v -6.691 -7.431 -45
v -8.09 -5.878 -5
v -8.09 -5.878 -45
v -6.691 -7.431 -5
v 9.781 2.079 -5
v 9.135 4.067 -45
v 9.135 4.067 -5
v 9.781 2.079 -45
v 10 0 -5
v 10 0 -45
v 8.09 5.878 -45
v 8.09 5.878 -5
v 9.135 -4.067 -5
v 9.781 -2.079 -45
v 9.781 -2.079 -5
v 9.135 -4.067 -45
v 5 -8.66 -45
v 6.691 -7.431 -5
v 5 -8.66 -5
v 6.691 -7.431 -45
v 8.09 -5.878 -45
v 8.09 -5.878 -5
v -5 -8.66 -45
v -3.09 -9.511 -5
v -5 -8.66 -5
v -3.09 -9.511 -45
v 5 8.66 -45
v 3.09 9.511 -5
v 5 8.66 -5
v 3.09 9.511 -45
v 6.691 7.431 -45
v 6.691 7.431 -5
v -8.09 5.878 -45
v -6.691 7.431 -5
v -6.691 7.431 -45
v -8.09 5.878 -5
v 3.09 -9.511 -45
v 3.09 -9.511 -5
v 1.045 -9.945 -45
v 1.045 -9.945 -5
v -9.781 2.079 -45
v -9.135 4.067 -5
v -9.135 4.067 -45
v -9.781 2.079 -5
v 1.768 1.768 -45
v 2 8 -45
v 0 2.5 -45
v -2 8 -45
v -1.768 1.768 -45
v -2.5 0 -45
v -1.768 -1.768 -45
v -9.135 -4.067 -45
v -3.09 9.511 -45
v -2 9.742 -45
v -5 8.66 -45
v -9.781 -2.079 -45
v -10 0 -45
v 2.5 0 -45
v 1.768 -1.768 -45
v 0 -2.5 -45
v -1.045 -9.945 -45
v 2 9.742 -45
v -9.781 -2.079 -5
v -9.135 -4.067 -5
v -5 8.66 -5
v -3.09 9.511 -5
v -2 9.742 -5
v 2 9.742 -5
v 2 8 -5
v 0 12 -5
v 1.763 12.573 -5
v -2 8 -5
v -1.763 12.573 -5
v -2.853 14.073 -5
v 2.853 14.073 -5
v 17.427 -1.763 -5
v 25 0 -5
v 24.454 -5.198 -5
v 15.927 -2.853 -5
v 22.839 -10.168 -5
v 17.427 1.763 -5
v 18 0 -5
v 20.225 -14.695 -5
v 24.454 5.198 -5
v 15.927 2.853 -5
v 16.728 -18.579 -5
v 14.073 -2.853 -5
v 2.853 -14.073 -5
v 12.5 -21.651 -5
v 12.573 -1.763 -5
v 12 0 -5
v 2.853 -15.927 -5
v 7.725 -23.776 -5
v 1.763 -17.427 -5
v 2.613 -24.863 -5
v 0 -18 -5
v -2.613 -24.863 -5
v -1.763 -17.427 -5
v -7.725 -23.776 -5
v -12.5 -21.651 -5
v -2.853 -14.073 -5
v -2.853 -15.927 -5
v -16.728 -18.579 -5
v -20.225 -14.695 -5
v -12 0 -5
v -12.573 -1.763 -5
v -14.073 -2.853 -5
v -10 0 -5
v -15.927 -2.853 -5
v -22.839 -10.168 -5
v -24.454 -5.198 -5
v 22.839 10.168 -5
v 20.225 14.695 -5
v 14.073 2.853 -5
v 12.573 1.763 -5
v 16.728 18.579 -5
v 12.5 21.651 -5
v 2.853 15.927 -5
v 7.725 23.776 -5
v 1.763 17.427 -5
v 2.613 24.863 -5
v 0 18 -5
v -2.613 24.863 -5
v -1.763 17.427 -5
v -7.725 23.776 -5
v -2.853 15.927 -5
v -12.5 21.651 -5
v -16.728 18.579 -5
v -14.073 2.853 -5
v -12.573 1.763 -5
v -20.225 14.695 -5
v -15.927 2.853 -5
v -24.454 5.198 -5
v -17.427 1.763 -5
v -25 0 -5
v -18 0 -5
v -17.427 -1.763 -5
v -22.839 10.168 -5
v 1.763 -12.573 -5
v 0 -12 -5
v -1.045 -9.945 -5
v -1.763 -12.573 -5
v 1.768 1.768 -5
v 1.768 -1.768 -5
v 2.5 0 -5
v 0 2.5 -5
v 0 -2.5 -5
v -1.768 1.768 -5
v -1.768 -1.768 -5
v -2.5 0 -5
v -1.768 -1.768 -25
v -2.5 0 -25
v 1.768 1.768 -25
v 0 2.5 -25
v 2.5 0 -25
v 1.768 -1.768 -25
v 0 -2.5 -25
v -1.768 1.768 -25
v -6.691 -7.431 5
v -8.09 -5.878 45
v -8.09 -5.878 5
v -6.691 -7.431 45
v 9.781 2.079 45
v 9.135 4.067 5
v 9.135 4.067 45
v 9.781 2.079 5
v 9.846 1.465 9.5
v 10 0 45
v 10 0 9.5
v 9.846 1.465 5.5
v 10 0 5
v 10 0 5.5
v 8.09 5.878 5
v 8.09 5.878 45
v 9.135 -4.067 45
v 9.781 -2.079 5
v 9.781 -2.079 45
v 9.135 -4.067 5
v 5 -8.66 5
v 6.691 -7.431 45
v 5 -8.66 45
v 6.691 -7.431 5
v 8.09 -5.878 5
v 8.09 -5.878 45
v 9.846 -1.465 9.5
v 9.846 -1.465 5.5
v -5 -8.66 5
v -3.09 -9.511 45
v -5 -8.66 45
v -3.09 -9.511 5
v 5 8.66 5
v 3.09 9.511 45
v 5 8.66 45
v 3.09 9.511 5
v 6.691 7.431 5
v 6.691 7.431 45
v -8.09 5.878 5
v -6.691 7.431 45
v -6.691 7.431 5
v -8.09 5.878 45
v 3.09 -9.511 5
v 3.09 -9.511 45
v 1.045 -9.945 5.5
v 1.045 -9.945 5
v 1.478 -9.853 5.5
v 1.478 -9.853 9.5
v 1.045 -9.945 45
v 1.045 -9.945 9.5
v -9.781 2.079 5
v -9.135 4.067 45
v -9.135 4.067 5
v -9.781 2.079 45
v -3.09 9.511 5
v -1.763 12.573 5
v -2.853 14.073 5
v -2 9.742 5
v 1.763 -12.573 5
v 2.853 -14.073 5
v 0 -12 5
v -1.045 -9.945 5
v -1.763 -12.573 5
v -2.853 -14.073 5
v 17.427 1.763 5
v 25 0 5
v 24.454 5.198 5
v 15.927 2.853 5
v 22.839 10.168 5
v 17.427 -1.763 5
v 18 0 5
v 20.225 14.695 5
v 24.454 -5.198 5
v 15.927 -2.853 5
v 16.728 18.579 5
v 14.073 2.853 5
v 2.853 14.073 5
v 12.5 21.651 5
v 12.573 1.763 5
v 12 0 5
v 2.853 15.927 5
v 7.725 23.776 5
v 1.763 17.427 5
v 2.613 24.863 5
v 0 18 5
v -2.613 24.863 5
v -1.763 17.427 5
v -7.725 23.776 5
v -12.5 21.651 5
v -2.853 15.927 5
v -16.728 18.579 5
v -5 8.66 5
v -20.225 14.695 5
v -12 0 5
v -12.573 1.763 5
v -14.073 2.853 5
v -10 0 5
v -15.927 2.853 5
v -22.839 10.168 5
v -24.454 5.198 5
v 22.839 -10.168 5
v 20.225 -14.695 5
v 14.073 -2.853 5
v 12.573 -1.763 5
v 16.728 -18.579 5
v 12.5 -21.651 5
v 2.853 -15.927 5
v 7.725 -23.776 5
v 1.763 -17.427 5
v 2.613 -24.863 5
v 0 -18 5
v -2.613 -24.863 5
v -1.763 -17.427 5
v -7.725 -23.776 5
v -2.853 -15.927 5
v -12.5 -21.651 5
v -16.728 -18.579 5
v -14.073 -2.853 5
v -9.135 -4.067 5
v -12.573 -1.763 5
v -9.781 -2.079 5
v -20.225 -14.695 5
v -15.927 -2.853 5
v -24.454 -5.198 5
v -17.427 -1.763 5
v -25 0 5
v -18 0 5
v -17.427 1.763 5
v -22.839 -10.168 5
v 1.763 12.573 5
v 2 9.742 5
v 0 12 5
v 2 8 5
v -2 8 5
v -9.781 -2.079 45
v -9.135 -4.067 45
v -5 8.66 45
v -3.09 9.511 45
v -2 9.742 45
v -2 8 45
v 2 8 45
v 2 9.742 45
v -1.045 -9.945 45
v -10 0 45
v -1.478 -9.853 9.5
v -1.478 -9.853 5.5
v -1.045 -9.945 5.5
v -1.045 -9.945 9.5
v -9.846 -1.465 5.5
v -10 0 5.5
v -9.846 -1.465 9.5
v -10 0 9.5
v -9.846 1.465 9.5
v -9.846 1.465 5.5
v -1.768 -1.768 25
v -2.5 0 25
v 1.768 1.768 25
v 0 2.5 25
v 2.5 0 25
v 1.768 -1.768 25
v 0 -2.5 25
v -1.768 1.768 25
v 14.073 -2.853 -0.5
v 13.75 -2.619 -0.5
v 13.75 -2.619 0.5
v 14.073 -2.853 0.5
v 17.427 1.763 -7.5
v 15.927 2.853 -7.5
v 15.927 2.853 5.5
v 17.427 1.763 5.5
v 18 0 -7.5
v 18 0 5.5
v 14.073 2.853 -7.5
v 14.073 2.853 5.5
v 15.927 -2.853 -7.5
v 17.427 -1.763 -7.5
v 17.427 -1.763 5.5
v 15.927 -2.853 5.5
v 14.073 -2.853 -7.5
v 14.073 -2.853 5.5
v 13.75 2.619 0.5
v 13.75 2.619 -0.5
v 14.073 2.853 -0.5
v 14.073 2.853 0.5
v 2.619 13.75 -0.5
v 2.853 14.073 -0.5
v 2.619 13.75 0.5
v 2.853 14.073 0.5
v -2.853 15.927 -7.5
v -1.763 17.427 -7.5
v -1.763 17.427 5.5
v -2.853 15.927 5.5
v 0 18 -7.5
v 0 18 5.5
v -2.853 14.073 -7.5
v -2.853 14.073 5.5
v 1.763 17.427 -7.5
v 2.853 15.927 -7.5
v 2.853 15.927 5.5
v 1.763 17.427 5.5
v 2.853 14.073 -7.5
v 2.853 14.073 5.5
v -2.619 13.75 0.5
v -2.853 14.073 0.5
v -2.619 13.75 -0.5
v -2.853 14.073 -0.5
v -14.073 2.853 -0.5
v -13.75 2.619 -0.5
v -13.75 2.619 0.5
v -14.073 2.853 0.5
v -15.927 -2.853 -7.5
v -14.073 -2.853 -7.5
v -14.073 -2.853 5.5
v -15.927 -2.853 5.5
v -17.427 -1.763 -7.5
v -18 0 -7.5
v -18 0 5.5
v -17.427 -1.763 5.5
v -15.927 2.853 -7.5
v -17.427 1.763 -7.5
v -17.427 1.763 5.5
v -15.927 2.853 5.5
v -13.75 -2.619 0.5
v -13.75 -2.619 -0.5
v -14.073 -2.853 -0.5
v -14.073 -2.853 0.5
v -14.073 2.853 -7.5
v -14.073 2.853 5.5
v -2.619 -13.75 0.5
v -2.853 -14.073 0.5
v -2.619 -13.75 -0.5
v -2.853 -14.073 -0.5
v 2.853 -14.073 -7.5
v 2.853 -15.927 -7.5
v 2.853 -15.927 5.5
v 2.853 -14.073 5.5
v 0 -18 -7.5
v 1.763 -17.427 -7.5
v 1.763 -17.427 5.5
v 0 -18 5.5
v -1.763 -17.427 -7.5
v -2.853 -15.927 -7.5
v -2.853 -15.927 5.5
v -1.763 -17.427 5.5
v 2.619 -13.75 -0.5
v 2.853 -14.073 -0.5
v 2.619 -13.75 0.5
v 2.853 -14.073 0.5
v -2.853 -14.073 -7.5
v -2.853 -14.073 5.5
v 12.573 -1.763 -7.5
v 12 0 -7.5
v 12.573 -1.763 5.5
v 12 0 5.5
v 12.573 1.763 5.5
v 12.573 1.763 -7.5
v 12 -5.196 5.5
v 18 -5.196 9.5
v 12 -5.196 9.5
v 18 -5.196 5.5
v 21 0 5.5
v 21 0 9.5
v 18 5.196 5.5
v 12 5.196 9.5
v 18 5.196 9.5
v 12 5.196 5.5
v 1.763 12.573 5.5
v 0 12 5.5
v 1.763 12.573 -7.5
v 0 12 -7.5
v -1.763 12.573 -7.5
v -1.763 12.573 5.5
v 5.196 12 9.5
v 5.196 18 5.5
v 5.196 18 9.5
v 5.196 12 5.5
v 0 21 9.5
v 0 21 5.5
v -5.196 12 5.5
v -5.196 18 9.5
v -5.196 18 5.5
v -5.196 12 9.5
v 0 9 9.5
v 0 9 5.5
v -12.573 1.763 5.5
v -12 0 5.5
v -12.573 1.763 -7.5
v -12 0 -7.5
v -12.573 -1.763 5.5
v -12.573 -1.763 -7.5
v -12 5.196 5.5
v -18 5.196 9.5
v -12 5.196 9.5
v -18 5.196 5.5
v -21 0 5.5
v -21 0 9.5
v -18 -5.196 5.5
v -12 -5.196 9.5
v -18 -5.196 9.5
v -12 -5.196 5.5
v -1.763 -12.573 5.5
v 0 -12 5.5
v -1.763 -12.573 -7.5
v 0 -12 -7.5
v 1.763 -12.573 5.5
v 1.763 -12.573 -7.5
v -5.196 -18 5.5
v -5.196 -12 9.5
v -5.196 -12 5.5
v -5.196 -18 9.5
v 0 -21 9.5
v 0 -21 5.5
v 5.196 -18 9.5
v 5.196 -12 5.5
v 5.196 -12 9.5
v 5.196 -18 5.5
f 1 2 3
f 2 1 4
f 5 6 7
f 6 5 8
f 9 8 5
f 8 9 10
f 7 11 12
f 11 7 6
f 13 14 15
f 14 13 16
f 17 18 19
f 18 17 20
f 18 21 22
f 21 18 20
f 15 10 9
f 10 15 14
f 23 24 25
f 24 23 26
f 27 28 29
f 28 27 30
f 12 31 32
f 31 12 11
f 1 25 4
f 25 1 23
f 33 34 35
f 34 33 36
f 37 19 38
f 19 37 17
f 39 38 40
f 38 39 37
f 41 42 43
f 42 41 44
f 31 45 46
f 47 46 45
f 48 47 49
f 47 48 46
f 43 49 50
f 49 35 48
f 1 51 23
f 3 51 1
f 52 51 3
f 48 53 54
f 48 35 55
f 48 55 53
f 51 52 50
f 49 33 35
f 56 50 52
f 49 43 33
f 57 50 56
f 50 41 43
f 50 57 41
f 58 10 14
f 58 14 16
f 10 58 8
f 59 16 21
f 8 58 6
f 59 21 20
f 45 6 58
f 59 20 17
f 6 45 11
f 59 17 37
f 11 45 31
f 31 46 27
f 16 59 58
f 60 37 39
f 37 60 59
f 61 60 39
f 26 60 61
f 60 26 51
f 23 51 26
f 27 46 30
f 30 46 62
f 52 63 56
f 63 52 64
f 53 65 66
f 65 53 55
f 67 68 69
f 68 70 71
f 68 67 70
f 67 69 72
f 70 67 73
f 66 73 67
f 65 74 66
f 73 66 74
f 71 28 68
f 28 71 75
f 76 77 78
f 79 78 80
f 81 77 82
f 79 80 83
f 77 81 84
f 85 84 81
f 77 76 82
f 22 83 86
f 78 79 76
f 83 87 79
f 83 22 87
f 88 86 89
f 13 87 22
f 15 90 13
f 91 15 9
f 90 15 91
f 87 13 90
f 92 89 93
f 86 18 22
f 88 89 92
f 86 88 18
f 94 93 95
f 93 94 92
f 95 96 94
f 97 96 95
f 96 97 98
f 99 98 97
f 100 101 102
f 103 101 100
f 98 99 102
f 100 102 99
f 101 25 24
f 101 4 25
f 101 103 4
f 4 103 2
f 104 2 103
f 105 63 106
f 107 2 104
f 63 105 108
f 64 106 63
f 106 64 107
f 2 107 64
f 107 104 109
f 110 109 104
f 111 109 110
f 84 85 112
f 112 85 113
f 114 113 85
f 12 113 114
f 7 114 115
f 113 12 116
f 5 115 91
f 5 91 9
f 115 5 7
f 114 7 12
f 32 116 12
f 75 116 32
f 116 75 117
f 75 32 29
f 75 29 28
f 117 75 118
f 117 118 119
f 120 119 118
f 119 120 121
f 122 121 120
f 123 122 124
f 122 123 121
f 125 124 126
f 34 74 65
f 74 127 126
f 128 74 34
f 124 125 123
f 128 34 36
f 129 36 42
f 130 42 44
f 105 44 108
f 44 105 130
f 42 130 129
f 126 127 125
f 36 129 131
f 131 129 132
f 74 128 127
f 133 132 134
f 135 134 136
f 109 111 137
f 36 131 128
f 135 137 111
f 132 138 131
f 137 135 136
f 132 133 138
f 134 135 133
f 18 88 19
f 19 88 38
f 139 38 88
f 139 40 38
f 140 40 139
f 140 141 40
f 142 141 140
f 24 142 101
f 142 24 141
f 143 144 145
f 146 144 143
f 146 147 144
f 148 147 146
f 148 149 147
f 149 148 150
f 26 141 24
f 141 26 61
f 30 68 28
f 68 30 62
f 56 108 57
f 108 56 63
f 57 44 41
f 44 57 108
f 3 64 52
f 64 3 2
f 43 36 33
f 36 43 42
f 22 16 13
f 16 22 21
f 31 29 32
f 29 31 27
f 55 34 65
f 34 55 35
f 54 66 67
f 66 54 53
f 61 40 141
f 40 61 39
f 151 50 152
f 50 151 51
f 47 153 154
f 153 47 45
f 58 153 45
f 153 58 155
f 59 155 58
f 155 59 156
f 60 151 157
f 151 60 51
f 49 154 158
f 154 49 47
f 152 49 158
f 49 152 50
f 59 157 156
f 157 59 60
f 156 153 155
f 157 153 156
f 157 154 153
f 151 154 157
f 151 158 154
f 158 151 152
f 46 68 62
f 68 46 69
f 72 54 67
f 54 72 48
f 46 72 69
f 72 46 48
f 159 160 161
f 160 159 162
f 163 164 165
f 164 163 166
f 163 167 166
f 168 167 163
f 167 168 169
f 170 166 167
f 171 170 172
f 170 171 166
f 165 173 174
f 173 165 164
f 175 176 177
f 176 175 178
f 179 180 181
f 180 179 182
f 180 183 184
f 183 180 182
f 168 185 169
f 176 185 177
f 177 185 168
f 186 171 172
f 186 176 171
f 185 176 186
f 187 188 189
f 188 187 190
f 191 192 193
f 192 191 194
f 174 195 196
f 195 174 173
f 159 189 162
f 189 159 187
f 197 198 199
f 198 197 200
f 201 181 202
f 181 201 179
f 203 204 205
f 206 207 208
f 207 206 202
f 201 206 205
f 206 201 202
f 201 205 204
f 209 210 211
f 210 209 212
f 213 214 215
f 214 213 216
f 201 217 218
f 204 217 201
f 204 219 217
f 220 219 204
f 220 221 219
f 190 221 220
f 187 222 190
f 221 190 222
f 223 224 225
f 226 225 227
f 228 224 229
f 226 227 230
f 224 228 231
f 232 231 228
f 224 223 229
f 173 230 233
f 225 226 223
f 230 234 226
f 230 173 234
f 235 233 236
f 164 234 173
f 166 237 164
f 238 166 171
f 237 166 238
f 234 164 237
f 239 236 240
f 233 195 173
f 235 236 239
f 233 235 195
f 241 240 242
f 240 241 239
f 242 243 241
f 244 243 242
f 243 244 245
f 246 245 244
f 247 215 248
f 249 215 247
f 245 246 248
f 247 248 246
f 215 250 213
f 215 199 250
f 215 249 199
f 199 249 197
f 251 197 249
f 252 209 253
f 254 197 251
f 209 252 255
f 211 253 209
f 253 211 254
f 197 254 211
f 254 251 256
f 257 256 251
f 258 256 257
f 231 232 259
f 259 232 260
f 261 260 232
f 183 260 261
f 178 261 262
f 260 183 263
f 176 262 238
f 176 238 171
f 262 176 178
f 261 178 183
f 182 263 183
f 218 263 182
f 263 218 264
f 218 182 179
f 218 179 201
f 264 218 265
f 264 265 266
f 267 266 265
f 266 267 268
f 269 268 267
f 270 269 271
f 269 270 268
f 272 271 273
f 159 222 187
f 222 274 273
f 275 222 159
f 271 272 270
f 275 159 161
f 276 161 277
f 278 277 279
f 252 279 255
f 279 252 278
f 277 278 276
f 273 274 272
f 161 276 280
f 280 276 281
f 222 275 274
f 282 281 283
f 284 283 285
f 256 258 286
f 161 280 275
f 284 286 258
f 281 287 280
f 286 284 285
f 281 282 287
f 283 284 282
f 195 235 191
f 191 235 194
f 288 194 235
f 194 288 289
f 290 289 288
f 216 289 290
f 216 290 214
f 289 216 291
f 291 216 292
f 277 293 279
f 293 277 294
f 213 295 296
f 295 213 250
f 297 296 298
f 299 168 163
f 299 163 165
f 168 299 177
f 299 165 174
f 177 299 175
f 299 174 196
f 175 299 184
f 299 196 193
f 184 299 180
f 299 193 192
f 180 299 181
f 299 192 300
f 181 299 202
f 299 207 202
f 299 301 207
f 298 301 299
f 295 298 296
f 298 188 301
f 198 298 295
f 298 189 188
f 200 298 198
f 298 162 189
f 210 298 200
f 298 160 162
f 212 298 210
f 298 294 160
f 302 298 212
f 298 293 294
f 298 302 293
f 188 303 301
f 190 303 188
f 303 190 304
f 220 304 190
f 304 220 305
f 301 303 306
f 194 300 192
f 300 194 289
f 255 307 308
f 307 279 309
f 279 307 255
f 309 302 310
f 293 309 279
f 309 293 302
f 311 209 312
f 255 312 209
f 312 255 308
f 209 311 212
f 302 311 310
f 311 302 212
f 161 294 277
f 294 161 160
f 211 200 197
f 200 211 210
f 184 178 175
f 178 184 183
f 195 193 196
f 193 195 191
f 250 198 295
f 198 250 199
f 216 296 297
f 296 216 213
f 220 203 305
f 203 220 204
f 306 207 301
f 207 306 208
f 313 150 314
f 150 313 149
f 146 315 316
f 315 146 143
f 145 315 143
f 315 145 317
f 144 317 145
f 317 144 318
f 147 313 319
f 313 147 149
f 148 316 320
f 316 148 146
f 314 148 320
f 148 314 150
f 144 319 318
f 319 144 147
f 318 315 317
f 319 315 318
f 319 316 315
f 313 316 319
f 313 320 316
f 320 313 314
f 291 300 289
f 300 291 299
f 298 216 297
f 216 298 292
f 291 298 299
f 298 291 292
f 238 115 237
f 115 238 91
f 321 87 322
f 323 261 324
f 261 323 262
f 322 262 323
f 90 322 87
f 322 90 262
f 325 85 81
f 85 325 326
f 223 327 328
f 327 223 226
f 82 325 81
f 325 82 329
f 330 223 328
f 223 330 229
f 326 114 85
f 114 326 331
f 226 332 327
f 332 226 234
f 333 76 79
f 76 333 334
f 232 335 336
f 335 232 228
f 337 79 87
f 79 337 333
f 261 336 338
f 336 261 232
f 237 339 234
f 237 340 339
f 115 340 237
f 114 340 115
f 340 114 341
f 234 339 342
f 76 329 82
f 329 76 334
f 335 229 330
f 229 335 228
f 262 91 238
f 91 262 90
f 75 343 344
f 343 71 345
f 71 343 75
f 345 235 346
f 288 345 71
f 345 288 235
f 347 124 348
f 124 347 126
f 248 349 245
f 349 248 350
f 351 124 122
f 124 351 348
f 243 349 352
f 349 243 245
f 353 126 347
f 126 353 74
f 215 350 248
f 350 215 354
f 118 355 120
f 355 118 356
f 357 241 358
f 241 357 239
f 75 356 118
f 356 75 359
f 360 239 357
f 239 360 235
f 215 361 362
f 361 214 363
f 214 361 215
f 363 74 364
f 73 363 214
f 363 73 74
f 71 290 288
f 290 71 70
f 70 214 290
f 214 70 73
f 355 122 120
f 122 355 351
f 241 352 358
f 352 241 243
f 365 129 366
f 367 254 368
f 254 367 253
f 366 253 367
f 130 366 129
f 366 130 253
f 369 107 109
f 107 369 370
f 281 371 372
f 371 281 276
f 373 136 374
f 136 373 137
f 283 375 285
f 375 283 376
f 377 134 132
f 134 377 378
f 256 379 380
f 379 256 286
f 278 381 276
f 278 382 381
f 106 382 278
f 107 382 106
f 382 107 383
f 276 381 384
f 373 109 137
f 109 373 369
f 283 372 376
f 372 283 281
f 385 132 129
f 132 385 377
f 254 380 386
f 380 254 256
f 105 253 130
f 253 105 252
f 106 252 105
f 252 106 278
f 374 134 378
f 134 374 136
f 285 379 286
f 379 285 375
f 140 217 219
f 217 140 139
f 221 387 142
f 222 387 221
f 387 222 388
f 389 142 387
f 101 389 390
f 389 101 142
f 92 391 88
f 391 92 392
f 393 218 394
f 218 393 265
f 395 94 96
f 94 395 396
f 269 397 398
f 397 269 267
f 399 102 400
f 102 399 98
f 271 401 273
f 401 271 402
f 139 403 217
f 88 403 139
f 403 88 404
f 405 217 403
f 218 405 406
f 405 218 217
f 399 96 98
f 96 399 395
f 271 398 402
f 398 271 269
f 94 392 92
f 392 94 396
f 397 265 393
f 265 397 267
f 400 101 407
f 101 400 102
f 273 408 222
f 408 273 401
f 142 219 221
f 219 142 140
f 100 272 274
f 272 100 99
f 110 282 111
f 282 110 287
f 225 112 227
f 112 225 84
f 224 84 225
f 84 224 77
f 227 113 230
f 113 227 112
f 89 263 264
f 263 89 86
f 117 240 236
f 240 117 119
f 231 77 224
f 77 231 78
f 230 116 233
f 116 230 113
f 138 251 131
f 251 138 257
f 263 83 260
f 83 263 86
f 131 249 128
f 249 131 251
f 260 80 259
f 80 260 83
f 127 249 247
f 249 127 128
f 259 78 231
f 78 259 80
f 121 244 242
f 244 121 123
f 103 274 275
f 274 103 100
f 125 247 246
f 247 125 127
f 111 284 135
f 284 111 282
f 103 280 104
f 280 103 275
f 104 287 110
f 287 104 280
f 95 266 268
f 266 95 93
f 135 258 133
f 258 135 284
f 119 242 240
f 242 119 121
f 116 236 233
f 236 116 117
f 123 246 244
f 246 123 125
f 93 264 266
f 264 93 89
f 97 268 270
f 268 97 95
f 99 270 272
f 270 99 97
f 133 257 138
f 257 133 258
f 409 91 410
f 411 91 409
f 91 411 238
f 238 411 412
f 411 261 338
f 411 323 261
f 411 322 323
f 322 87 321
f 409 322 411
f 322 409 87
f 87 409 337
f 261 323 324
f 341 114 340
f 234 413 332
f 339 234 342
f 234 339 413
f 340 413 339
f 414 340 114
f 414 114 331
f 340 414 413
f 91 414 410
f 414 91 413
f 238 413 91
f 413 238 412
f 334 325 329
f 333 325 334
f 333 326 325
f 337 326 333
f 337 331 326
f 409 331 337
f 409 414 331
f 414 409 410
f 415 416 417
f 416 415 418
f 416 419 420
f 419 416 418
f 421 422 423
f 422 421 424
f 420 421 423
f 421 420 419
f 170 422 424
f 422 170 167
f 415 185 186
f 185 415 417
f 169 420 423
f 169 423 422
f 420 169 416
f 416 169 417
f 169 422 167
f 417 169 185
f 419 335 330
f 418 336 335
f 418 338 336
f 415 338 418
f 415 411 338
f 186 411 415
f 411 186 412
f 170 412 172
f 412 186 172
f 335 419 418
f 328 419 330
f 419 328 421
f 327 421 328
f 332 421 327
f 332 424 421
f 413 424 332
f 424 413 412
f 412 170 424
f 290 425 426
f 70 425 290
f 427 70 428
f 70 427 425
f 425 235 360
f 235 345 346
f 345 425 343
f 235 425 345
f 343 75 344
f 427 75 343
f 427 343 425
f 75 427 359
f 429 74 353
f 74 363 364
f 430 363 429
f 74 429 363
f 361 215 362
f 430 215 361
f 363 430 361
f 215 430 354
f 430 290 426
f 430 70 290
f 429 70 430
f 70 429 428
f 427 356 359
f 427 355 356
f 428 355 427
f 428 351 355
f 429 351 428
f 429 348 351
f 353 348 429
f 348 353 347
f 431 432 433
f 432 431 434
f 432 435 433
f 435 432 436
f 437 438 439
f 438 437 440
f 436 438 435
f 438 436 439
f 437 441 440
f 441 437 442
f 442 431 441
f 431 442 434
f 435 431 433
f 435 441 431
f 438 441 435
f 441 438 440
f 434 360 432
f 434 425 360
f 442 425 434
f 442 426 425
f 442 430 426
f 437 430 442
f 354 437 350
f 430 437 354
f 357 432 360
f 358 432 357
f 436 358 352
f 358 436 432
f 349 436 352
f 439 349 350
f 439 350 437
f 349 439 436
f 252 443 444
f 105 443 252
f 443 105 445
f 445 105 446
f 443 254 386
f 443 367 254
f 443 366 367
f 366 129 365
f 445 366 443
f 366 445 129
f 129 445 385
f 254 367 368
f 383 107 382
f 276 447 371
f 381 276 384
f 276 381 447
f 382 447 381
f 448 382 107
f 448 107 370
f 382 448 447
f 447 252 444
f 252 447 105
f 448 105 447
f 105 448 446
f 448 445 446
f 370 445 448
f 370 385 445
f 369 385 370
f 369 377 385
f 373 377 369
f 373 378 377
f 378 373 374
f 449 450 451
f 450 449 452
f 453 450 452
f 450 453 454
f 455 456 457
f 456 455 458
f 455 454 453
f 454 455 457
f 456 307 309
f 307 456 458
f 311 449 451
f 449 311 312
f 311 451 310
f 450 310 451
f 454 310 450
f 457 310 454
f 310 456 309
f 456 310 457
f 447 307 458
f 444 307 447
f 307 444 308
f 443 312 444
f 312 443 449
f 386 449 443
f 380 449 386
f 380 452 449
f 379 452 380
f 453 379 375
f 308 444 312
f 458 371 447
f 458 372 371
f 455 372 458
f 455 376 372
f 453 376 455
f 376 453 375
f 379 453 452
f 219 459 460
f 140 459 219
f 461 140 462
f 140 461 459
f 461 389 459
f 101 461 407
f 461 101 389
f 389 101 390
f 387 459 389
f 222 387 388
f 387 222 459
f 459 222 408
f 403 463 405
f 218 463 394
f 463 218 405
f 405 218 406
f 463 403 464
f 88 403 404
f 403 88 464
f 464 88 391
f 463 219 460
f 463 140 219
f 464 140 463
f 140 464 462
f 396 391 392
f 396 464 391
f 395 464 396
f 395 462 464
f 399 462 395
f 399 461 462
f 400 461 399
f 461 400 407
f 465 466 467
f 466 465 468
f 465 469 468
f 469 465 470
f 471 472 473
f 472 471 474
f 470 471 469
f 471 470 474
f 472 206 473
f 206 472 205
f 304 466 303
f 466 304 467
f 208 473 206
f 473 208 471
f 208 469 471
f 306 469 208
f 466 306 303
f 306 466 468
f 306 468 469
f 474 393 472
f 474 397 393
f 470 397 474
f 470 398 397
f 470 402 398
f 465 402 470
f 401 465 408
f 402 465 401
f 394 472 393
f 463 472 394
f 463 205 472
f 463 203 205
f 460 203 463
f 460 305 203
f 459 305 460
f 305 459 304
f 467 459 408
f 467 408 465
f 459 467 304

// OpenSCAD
//start

// Parameters
shaft_diameter = 20;
shaft_length = 40;
flange_diameter = 50;
flange_thickness = 5;
bolt_hole_radius = 3;
bolt_radius = 3;
bolt_length = 15;
nut_size = 6;
diaphragm_thickness = 1;
diaphragm_diameter = 45;
keyway_width = 4;
keyway_depth = 2;

// Function to create a shaft with a keyway
module shaft() {
    difference() {
        cylinder(h=shaft_length, d=shaft_diameter, center=true);
        translate([0, 0, -shaft_length/2])
            cylinder(h=shaft_length, d=5, center=true); // Central hole
        translate([-keyway_width/2, shaft_diameter/2 - keyway_depth, -shaft_length/2])
            cube([keyway_width, keyway_depth, shaft_length]); // Keyway slot
    }
}

// Function to create a flange plate
module flange_plate() {
    difference() {
        cylinder(h=flange_thickness, d=flange_diameter, center=true);
        cylinder(h=flange_thickness+1, d=5, center=true); // Central hole
        for (i = [0:3]) {
            rotate([0, 0, i * 90])
                translate([flange_diameter/2 - 10, 0, 0])
                    cylinder(h=flange_thickness+1, r=bolt_hole_radius, center=true); // Bolt holes
        }
    }
}

// Function to create the flexible diaphragm
module flexible_diaphragm() {
    difference() {
        cylinder(h=diaphragm_thickness, d=diaphragm_diameter, center=true);
        cylinder(h=diaphragm_thickness+1, d=5, center=true); // Central hole
        for (i = [0:3]) {
            rotate([0, 0, i * 90])
                translate([diaphragm_diameter/2 - 10, 0, 0])
                    cylinder(h=diaphragm_thickness+1, r=bolt_hole_radius, center=true); // Bolt holes
        }
    }
}

// Function to create a bolt
module bolt() {
    cylinder(h=bolt_length, r=bolt_radius, center=true);
}

// Function to create a nut
module nut() {
    cylinder(h=4, r=nut_size, center=true, $fn=6);
}

// Assembly
module coupling() {
    // Input Shaft
    translate([0, 0, -shaft_length/2 - flange_thickness])
        shaft();
    
    // Output Shaft
    translate([0, 0, shaft_length/2 + flange_thickness])
        shaft();
    
    // Flange Plate 1
    translate([0, 0, -flange_thickness/2])
        flange_plate();
    
    // Flange Plate 2
    translate([0, 0, flange_thickness/2])
        flange_plate();
    
    // Flexible Diaphragm
    translate([0, 0, 0])
        flexible_diaphragm();
    
    // Bolts and Nuts
    for (i = [0:3]) {
        rotate([0, 0, i * 90]) {
            translate([flange_diameter/2 - 10, 0, 0]) {
                bolt();
                translate([0, 0, bolt_length/2])
                    nut();
            }
        }
    }
}

// Render the coupling
coupling();
